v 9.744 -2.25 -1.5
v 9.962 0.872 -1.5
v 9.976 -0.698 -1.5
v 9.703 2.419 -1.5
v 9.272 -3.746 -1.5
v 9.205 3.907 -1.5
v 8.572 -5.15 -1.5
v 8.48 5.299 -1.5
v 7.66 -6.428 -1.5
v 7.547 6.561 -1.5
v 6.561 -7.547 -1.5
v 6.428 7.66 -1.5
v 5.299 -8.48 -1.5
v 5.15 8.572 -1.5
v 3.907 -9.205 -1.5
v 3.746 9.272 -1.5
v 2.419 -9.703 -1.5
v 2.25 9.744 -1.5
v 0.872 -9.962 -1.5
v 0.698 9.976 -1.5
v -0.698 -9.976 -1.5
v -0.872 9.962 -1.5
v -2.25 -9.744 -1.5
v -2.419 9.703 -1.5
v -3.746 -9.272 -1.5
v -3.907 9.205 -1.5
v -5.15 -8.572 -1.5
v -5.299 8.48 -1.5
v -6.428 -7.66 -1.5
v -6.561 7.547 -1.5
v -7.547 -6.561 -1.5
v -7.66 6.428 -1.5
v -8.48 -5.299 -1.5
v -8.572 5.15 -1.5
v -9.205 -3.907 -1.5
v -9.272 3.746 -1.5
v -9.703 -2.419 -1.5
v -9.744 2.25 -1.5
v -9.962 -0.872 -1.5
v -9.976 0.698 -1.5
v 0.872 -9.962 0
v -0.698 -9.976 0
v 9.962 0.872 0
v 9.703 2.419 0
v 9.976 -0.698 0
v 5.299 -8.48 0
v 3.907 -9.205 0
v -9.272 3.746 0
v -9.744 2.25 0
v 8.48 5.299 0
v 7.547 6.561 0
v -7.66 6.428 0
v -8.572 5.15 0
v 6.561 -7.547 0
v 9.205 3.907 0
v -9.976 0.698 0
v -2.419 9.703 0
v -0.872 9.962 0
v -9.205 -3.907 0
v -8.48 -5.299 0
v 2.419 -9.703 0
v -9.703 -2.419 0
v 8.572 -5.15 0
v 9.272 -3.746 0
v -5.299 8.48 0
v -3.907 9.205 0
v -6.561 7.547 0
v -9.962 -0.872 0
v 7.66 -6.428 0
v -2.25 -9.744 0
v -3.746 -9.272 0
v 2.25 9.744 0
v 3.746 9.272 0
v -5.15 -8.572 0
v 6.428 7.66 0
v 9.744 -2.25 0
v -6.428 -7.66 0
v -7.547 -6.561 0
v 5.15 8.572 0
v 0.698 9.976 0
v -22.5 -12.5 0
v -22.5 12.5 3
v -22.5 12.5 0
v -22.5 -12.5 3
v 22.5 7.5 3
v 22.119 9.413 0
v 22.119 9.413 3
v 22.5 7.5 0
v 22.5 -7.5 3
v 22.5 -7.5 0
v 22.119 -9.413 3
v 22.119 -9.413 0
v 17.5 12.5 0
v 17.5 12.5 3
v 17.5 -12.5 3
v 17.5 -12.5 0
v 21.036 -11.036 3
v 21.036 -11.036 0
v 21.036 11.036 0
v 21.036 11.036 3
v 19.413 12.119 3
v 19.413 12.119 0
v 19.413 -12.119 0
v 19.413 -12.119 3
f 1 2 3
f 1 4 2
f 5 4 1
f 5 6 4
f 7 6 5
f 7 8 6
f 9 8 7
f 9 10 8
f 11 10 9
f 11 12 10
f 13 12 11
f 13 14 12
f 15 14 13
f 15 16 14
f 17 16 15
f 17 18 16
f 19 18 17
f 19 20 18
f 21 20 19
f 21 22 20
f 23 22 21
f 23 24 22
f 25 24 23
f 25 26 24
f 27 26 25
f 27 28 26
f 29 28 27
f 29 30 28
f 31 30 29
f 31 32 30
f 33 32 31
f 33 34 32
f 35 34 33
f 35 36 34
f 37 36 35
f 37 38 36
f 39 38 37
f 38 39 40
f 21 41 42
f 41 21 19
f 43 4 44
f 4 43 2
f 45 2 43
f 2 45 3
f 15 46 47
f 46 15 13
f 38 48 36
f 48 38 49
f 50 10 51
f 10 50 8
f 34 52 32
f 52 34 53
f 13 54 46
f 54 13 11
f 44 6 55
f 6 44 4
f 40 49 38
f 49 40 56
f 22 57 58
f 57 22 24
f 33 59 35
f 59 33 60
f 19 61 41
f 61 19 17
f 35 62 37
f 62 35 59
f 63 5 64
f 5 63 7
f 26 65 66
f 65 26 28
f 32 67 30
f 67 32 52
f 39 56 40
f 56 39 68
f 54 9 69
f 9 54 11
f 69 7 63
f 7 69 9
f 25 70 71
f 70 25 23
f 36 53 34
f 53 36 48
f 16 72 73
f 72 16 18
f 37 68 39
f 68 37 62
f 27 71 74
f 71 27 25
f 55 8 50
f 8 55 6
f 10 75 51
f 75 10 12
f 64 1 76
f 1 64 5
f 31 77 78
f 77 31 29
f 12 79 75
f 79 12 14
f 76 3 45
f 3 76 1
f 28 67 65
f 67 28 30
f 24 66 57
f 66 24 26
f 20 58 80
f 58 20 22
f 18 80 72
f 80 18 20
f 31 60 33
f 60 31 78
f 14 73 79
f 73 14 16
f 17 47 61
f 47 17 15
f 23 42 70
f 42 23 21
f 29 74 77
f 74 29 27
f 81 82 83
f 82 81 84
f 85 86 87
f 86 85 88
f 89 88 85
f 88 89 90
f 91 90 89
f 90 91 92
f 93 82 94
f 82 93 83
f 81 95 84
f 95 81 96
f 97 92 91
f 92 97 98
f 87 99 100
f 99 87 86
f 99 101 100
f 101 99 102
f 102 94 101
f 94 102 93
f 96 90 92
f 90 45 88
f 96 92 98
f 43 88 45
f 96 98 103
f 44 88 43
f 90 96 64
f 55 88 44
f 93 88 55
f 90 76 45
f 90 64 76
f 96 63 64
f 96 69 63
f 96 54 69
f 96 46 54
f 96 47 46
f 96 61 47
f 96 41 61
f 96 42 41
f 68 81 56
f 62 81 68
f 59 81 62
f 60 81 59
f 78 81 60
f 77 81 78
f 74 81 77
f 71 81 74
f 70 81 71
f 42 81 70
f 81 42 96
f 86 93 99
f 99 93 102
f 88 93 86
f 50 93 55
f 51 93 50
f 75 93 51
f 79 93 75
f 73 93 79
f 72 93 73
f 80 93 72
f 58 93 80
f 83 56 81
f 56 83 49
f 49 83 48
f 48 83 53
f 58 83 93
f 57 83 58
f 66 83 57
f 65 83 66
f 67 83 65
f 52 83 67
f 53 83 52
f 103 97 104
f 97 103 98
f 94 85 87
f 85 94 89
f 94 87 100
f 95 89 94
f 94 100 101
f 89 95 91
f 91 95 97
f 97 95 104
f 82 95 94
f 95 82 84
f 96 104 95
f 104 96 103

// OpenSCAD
/*
 * Catbot scad file for cnc cutting
 */


use <MCAD/involute_gears.scad>

/*
 * Variables 
 */ 

matTh = 3; 				// material thickness
gearInitSize = 2.5; 	// TO DO : CLEANUP 
gearDist = 21; 			// TO DO : CLEANUP




/*
 * ELEMENTS 
 */

/*
 * CIRCULAR SERVO HORN MODULE  
 *
 * place circles in the corners, with the given radius, to have or not 
 * rounded corners and array is used for 0 no corner 1 for corners 
 * css style (top right, bottom right, bottom left, top left )
 *
 * PARAMS  		:
 * diam       	: outer gear Diameter 
 * innerRadius 	: gear diameter (usuasly a bit smaller than the servo geared axis)
 */	

module servoCircHorn(diam,innerRadius,gearHeight) {
	rotate([0,0,-4]) difference() {
		cylinder(h=matTh, r=diam, center=true, $fn=40);
		translate([0,0,-1*matTh +1])
			servoConnectorGear(innerRadius,matTh);
	}
}


/*
 * BORDER  RADIUS BOX MODULE  
 *
 * place circles in the corners, with the given radius, to have or not 
 * rounded corners and array is used for 0 no corner 1 for corners 
 * css style (top right, bottom right, bottom left, top left )
 *
 * PARAMS  :
 * size    : array [X,Y,Z]
 * radius  : the round corner radius
 * corners : 0 no corner 1 for corners 
 * css style (top right, bottom right, bottom left, top left )
 *
 */	

module borderRadiusbox(size, radius,corners)
{
	x = size[0];
	y = size[1];
	z = size[2];

	linear_extrude(height=z)
	hull(){
		
	// top left
	if(corners[3] == 1) {
		translate([(-x/2)+(radius/2), (y/2)-(radius/2), 0])
		circle(r=radius);
	} else {
		translate([(-x/2), (y/2), 0])
		square(radius,true);
	}

	// top right
	if (corners[0] == 1 ){
		translate([(x/2)-(radius/2), (y/2)-(radius/2), 0])
		circle(r=radius);	
	} else {
		translate([(x/2), (y/2), 0])
		square(radius,true);
	}
	

	// bottom right
	if(corners[1] == 1) {
		translate([(x/2)-(radius/2), (-y/2)+(radius/2), 0])
		circle(r=radius);
	} else {
		translate([(x/2), (-y/2), 0])
		square(radius,true);
	}
	// bottom left 
	if(corners[2] == 1) {

		translate([(-x/2)+(radius/2), (-y/2)+(radius/2), 0])
		circle(r=radius);
	} else {
		translate([(-x/2), (-y/2), 0])
 		square(radius,true);
	}
	}
}



borderRadiusbox([40,20,matTh], 5,[1,1,0,0]);
/*
// array of gears for testing
for ( i = [0 : 10] )
{
    translate([gearDist*i,0,0]){

		projection(cut = true) servoCircHorn(10,gearInitSize - 0.1*i);
    }
	

}
*/

//projection(cut = true)
servoCircHorn(10,2.5);




module servoConnectorGear(innerRadius) {
	
	innerteeth=12;
	innerpitch = innerRadius/innerteeth*360;

		
			gear (number_of_teeth=innerteeth,
				pressure_angle=45,
				circular_pitch=innerpitch,
   		   gear_thickness = matTh+1,
      		rim_thickness = matTh+1,
	      	hub_thickness = matTh+1,
				bore_diameter = 0);
	
}

//cylinder(h=matTh, r=10, center=true, $fn=20);

//cube(size=[10,10,matTh], center=true);



module footBar(length,width,height) {
	difference(){
		union(){
			translate([-length/2,-width/2,0]) cube([length,width,height]);
			translate([-length/2,0,0]) cylinder(r=width/2,h=height,$fn=45);
			translate([length/2,0,0]) cylinder(r=width/2,h=height,$fn=45);
		}
		translate([-length/2,0,0])cylinder(r=1, h=10, center=true,$fn=45);
		translate([length/2,0,0])cylinder(r=1, h=10, center=true,$fn=45);
		translate([-length/4,0,0])cylinder(r=1, h=10, center=true,$fn=45);
		translate([length/4,0,0])cylinder(r=1, h=10, center=true,$fn=45);
	}
}

module foot(withServo) {
	footBar(100,10,3);
	rotate([0,0,90]) footBar(100,10,3);
	translate([-5.5,0,2]) cageUp(withServo);
	translate([-18,-8,0]) cube([25,16,3]);
}


module servo() {
	color("LightBlue", 0.5) {
		cube([23.5,12.6,16.4]);
		translate([-4.65,0,16.3]) difference() {
			cube([32.8,12.6,2]);
			translate([2.65,6.3,-0.1]) cylinder(r=1,h=3,$fn=45);
			translate([32.8-2.65,6.3,-0.1]) cylinder(r=1,h=3,$fn=45);
		}
		translate([0,0,18.2]) cube([23.5,12.6,4.4]);
		translate([6.3,6.3,22.5]) cylinder(r=6.3,h=4.1,$fn=45);
		translate([6.3,6.3,26.5]) cylinder(r=2.25,h=2.8,$fn=45);
	}
}

module overview() {
	foot(true);
	translate([0,0,38]) swing(true);
	translate([0,0,43]) arm(true, true);
	translate([49.5,0,43]) arm(true, false);
	translate([99,0,43]) {
		armFront(true);

	}
}




//servoConnectorGear(2.6);

// shows the complete thing

//overview();
